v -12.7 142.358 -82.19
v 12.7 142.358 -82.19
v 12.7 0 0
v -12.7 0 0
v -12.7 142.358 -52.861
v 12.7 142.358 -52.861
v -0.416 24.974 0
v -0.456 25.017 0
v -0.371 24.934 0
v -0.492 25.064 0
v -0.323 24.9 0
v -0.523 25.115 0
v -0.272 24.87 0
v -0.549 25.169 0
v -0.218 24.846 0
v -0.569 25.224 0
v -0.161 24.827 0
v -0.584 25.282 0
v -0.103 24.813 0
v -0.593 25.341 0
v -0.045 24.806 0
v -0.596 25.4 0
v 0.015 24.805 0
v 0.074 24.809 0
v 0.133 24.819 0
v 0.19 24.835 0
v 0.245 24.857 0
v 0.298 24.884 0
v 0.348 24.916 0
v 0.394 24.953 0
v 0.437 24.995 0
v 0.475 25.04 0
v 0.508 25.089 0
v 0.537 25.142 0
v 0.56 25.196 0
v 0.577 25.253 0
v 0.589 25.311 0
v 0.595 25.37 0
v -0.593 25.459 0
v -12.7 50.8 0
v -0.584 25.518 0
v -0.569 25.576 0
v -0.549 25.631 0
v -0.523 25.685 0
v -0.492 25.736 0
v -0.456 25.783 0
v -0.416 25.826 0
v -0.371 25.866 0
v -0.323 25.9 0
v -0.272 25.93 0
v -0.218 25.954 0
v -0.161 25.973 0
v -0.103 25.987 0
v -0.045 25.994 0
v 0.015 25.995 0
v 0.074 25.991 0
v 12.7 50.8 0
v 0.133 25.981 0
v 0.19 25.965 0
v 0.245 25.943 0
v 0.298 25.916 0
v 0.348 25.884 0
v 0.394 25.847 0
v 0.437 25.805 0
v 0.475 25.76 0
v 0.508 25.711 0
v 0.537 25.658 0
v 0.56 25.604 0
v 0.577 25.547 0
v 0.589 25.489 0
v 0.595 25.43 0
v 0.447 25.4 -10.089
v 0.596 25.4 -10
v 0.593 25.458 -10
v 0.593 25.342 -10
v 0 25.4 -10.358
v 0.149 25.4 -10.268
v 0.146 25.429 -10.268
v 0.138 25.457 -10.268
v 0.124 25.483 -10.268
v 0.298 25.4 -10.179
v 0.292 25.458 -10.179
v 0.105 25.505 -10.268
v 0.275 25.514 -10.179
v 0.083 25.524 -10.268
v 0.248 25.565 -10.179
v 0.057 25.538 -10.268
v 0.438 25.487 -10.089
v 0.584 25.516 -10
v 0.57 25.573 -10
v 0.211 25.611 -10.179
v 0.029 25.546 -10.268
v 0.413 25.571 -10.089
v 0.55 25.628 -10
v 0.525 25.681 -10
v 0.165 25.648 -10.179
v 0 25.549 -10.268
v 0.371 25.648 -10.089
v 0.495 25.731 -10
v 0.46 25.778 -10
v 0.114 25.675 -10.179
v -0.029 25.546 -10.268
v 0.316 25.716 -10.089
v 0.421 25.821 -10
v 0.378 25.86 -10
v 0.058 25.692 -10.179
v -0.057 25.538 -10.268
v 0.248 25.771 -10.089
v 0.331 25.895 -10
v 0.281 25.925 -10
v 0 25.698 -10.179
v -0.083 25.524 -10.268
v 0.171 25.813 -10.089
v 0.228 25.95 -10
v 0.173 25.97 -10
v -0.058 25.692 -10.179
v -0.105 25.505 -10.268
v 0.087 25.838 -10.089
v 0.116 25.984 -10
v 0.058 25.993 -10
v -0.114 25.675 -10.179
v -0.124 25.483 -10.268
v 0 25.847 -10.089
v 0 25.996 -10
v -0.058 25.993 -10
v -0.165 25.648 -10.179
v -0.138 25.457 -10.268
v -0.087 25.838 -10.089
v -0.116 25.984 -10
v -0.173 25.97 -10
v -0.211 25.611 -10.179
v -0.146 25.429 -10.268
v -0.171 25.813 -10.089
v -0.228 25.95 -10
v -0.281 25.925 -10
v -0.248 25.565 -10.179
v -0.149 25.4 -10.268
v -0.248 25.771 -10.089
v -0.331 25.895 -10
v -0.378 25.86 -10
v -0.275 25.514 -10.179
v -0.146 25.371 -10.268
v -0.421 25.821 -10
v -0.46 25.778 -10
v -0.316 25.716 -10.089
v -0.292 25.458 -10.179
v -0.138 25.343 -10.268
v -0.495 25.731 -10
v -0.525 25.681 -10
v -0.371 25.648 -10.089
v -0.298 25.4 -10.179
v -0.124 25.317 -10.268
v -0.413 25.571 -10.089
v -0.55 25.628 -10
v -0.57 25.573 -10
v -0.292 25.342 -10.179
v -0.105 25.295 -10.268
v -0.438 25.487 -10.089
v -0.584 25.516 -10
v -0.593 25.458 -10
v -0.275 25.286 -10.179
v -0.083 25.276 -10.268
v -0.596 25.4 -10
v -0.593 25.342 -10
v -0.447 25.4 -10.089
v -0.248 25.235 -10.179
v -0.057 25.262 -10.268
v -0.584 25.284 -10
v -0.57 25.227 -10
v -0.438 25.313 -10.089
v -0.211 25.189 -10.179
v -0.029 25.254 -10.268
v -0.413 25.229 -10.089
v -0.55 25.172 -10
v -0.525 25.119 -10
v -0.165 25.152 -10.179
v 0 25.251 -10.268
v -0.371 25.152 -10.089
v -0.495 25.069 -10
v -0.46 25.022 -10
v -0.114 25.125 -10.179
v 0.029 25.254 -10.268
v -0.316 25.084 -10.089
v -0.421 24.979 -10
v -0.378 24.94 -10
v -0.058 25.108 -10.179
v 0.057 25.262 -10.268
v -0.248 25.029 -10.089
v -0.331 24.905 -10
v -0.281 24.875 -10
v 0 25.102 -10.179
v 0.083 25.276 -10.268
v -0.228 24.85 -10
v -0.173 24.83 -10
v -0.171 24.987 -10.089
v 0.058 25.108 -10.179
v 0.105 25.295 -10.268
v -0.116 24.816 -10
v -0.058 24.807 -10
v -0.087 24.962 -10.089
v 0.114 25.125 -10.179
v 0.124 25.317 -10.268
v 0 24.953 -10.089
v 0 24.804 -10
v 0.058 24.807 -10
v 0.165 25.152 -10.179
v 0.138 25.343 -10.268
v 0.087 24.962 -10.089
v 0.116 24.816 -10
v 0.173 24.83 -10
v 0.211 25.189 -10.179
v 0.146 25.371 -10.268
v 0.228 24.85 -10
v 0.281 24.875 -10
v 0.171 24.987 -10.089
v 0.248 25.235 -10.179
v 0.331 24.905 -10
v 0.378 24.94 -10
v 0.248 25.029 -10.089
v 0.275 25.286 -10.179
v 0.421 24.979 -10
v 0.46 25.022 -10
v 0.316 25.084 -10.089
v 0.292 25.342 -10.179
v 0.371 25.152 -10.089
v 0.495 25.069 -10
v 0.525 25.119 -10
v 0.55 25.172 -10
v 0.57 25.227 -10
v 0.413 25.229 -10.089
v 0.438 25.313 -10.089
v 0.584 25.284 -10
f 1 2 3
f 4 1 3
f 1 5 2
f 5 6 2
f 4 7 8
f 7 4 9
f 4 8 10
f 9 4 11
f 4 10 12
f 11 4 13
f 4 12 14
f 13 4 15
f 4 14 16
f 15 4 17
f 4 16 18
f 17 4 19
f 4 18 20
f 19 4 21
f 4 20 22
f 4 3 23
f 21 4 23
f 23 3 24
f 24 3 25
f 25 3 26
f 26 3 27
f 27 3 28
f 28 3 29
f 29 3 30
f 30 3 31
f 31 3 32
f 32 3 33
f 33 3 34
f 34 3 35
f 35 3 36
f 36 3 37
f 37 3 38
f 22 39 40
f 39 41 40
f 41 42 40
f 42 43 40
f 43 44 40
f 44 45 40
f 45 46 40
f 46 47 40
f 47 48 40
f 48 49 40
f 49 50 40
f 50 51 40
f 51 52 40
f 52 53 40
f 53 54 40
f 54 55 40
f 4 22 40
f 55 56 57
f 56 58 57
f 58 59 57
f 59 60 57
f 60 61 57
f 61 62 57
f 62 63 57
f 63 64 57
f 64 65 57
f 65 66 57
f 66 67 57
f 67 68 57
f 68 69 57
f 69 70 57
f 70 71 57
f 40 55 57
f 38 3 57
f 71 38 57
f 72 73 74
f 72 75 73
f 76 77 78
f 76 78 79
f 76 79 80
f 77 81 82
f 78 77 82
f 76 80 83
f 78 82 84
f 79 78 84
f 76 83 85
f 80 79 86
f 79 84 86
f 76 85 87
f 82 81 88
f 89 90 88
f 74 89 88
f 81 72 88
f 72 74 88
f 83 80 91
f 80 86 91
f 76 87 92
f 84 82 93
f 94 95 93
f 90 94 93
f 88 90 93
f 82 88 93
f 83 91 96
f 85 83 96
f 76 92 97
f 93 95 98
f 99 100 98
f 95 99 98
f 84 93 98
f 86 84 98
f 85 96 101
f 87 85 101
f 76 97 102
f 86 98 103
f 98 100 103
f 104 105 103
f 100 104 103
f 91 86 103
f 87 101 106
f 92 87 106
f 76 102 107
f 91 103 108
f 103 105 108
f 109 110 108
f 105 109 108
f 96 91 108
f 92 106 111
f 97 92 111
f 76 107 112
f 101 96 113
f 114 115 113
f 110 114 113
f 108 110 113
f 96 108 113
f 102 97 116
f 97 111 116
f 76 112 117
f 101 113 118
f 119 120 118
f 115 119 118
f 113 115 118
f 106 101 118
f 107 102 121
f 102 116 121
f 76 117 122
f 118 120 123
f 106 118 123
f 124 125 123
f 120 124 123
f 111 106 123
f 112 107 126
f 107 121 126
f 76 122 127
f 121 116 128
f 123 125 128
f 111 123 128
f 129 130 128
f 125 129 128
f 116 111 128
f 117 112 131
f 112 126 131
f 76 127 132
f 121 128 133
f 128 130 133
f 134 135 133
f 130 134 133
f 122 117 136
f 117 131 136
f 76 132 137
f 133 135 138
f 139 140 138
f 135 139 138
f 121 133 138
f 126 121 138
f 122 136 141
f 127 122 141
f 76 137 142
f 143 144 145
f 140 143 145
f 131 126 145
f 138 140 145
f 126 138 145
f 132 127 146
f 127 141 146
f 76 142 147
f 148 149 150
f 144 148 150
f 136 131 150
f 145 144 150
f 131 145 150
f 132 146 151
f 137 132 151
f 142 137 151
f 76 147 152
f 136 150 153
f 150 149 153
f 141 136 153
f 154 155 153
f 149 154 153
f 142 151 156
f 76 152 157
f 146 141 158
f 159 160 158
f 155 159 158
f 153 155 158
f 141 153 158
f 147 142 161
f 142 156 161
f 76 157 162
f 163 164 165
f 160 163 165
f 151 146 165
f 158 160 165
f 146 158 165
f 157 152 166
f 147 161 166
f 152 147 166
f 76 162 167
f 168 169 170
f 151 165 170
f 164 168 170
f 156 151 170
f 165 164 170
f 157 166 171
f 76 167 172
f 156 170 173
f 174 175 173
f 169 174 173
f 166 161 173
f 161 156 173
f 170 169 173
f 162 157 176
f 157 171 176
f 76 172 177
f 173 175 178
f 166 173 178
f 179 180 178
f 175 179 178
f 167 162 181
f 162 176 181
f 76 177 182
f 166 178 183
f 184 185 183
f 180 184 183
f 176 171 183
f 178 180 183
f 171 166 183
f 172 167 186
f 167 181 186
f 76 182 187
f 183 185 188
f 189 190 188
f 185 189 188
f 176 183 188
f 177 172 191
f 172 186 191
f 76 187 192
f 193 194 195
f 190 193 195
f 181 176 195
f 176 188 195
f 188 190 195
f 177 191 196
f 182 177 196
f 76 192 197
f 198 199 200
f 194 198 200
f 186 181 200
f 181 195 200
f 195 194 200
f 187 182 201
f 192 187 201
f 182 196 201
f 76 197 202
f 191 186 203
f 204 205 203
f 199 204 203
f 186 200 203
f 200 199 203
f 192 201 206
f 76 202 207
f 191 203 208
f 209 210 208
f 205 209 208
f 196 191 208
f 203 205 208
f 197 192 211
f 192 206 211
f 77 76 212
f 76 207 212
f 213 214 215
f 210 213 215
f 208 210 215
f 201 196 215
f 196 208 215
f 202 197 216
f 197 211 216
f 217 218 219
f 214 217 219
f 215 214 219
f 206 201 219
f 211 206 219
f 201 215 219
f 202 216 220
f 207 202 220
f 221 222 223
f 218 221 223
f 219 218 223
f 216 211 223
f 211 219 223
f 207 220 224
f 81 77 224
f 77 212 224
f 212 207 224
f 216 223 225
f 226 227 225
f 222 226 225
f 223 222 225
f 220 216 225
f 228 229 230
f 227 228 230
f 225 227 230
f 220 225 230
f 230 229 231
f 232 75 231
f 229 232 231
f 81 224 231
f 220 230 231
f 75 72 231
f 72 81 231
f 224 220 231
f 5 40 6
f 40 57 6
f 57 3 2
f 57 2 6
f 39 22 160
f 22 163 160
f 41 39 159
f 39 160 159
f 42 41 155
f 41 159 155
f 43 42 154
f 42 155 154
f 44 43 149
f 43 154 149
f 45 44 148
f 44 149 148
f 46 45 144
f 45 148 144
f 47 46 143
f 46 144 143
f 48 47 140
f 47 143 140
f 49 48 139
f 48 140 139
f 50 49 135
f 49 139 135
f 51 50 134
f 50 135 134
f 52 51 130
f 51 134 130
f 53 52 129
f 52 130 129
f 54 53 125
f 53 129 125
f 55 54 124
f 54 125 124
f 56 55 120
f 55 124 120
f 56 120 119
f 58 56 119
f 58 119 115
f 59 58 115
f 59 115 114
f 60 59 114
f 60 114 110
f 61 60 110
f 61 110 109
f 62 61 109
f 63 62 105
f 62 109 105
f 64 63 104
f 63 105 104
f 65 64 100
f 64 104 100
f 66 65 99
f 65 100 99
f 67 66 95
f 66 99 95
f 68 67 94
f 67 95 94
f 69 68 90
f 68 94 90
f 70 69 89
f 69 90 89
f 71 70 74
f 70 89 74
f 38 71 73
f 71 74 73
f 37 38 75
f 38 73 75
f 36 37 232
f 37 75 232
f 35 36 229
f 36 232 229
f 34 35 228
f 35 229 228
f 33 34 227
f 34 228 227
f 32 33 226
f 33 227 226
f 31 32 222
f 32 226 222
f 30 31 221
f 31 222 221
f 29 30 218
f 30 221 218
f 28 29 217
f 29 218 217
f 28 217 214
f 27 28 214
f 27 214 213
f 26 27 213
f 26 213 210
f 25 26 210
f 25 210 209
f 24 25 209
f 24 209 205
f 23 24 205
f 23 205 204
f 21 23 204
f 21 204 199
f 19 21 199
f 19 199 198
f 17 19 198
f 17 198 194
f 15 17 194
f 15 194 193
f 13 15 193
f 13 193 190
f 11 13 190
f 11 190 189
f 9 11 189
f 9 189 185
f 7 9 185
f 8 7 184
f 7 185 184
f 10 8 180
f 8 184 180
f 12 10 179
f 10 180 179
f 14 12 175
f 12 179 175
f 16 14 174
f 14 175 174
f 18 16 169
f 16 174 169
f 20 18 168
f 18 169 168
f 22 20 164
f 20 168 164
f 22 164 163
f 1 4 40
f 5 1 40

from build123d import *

# Parameters (mm, degrees)
BOSS_EXTRUDE1_DEPTH       = 12.7
F_0_80_TAPPED_HOLE1_D     = 1.19126
F_0_80_TAPPED_HOLE1_DEPTH = 10
F_0_80_TAPPED_HOLE1_TIP   = 0.357890611


with BuildPart() as part:
    # Sketch1 → Boss-Extrude1 (new body, symmetric)
    with BuildSketch(Plane(origin=(0, 0, 0), x_dir=(0, 0, -1), z_dir=(1, 0, 0))):
        Polygon((0, 0), (0, 50.8), (52.861, 142.357937739), (82.190393675, 142.357937739), align=None)
    extrude(amount=BOSS_EXTRUDE1_DEPTH, both=True)

    # #0-80 Tapped Hole1
    with Locations(Plane.XY):
        with Locations((0, 25.4)):
            Hole(F_0_80_TAPPED_HOLE1_D / 2, depth=F_0_80_TAPPED_HOLE1_DEPTH)
            with Locations((0, 0, -(F_0_80_TAPPED_HOLE1_DEPTH + F_0_80_TAPPED_HOLE1_TIP / 2))):  # 118° drill point
                Cone(0, F_0_80_TAPPED_HOLE1_D / 2, F_0_80_TAPPED_HOLE1_TIP, mode=Mode.SUBTRACT)


solid = part.part
